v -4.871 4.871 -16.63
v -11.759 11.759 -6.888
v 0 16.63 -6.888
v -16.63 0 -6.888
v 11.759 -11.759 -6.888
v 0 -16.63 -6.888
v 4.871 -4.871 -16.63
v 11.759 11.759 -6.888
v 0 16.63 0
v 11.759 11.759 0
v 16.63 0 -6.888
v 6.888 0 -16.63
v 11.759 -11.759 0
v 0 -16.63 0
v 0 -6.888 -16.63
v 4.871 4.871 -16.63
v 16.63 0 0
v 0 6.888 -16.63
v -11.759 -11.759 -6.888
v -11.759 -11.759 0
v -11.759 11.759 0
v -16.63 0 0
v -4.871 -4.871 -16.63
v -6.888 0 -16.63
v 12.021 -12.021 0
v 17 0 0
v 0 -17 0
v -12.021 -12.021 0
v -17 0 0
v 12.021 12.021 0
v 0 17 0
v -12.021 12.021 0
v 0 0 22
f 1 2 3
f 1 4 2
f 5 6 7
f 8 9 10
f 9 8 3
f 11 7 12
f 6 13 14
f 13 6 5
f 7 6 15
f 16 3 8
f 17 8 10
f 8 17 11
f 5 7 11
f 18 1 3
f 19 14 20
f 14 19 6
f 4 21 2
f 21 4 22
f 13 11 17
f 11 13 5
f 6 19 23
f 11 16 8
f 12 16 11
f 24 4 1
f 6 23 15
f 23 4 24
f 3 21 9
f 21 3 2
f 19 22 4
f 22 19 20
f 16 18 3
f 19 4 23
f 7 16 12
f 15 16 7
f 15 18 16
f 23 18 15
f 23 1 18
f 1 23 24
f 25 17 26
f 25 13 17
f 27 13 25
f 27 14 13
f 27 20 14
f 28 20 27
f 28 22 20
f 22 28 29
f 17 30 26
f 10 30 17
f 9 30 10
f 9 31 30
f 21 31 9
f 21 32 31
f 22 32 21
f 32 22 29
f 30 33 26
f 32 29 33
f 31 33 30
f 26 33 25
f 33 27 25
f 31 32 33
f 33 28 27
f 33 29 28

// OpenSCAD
$fn=8;

cylinder(22,17,0);

difference(){
{

sphere(18);
}
cylinder(22,170,0);
}
